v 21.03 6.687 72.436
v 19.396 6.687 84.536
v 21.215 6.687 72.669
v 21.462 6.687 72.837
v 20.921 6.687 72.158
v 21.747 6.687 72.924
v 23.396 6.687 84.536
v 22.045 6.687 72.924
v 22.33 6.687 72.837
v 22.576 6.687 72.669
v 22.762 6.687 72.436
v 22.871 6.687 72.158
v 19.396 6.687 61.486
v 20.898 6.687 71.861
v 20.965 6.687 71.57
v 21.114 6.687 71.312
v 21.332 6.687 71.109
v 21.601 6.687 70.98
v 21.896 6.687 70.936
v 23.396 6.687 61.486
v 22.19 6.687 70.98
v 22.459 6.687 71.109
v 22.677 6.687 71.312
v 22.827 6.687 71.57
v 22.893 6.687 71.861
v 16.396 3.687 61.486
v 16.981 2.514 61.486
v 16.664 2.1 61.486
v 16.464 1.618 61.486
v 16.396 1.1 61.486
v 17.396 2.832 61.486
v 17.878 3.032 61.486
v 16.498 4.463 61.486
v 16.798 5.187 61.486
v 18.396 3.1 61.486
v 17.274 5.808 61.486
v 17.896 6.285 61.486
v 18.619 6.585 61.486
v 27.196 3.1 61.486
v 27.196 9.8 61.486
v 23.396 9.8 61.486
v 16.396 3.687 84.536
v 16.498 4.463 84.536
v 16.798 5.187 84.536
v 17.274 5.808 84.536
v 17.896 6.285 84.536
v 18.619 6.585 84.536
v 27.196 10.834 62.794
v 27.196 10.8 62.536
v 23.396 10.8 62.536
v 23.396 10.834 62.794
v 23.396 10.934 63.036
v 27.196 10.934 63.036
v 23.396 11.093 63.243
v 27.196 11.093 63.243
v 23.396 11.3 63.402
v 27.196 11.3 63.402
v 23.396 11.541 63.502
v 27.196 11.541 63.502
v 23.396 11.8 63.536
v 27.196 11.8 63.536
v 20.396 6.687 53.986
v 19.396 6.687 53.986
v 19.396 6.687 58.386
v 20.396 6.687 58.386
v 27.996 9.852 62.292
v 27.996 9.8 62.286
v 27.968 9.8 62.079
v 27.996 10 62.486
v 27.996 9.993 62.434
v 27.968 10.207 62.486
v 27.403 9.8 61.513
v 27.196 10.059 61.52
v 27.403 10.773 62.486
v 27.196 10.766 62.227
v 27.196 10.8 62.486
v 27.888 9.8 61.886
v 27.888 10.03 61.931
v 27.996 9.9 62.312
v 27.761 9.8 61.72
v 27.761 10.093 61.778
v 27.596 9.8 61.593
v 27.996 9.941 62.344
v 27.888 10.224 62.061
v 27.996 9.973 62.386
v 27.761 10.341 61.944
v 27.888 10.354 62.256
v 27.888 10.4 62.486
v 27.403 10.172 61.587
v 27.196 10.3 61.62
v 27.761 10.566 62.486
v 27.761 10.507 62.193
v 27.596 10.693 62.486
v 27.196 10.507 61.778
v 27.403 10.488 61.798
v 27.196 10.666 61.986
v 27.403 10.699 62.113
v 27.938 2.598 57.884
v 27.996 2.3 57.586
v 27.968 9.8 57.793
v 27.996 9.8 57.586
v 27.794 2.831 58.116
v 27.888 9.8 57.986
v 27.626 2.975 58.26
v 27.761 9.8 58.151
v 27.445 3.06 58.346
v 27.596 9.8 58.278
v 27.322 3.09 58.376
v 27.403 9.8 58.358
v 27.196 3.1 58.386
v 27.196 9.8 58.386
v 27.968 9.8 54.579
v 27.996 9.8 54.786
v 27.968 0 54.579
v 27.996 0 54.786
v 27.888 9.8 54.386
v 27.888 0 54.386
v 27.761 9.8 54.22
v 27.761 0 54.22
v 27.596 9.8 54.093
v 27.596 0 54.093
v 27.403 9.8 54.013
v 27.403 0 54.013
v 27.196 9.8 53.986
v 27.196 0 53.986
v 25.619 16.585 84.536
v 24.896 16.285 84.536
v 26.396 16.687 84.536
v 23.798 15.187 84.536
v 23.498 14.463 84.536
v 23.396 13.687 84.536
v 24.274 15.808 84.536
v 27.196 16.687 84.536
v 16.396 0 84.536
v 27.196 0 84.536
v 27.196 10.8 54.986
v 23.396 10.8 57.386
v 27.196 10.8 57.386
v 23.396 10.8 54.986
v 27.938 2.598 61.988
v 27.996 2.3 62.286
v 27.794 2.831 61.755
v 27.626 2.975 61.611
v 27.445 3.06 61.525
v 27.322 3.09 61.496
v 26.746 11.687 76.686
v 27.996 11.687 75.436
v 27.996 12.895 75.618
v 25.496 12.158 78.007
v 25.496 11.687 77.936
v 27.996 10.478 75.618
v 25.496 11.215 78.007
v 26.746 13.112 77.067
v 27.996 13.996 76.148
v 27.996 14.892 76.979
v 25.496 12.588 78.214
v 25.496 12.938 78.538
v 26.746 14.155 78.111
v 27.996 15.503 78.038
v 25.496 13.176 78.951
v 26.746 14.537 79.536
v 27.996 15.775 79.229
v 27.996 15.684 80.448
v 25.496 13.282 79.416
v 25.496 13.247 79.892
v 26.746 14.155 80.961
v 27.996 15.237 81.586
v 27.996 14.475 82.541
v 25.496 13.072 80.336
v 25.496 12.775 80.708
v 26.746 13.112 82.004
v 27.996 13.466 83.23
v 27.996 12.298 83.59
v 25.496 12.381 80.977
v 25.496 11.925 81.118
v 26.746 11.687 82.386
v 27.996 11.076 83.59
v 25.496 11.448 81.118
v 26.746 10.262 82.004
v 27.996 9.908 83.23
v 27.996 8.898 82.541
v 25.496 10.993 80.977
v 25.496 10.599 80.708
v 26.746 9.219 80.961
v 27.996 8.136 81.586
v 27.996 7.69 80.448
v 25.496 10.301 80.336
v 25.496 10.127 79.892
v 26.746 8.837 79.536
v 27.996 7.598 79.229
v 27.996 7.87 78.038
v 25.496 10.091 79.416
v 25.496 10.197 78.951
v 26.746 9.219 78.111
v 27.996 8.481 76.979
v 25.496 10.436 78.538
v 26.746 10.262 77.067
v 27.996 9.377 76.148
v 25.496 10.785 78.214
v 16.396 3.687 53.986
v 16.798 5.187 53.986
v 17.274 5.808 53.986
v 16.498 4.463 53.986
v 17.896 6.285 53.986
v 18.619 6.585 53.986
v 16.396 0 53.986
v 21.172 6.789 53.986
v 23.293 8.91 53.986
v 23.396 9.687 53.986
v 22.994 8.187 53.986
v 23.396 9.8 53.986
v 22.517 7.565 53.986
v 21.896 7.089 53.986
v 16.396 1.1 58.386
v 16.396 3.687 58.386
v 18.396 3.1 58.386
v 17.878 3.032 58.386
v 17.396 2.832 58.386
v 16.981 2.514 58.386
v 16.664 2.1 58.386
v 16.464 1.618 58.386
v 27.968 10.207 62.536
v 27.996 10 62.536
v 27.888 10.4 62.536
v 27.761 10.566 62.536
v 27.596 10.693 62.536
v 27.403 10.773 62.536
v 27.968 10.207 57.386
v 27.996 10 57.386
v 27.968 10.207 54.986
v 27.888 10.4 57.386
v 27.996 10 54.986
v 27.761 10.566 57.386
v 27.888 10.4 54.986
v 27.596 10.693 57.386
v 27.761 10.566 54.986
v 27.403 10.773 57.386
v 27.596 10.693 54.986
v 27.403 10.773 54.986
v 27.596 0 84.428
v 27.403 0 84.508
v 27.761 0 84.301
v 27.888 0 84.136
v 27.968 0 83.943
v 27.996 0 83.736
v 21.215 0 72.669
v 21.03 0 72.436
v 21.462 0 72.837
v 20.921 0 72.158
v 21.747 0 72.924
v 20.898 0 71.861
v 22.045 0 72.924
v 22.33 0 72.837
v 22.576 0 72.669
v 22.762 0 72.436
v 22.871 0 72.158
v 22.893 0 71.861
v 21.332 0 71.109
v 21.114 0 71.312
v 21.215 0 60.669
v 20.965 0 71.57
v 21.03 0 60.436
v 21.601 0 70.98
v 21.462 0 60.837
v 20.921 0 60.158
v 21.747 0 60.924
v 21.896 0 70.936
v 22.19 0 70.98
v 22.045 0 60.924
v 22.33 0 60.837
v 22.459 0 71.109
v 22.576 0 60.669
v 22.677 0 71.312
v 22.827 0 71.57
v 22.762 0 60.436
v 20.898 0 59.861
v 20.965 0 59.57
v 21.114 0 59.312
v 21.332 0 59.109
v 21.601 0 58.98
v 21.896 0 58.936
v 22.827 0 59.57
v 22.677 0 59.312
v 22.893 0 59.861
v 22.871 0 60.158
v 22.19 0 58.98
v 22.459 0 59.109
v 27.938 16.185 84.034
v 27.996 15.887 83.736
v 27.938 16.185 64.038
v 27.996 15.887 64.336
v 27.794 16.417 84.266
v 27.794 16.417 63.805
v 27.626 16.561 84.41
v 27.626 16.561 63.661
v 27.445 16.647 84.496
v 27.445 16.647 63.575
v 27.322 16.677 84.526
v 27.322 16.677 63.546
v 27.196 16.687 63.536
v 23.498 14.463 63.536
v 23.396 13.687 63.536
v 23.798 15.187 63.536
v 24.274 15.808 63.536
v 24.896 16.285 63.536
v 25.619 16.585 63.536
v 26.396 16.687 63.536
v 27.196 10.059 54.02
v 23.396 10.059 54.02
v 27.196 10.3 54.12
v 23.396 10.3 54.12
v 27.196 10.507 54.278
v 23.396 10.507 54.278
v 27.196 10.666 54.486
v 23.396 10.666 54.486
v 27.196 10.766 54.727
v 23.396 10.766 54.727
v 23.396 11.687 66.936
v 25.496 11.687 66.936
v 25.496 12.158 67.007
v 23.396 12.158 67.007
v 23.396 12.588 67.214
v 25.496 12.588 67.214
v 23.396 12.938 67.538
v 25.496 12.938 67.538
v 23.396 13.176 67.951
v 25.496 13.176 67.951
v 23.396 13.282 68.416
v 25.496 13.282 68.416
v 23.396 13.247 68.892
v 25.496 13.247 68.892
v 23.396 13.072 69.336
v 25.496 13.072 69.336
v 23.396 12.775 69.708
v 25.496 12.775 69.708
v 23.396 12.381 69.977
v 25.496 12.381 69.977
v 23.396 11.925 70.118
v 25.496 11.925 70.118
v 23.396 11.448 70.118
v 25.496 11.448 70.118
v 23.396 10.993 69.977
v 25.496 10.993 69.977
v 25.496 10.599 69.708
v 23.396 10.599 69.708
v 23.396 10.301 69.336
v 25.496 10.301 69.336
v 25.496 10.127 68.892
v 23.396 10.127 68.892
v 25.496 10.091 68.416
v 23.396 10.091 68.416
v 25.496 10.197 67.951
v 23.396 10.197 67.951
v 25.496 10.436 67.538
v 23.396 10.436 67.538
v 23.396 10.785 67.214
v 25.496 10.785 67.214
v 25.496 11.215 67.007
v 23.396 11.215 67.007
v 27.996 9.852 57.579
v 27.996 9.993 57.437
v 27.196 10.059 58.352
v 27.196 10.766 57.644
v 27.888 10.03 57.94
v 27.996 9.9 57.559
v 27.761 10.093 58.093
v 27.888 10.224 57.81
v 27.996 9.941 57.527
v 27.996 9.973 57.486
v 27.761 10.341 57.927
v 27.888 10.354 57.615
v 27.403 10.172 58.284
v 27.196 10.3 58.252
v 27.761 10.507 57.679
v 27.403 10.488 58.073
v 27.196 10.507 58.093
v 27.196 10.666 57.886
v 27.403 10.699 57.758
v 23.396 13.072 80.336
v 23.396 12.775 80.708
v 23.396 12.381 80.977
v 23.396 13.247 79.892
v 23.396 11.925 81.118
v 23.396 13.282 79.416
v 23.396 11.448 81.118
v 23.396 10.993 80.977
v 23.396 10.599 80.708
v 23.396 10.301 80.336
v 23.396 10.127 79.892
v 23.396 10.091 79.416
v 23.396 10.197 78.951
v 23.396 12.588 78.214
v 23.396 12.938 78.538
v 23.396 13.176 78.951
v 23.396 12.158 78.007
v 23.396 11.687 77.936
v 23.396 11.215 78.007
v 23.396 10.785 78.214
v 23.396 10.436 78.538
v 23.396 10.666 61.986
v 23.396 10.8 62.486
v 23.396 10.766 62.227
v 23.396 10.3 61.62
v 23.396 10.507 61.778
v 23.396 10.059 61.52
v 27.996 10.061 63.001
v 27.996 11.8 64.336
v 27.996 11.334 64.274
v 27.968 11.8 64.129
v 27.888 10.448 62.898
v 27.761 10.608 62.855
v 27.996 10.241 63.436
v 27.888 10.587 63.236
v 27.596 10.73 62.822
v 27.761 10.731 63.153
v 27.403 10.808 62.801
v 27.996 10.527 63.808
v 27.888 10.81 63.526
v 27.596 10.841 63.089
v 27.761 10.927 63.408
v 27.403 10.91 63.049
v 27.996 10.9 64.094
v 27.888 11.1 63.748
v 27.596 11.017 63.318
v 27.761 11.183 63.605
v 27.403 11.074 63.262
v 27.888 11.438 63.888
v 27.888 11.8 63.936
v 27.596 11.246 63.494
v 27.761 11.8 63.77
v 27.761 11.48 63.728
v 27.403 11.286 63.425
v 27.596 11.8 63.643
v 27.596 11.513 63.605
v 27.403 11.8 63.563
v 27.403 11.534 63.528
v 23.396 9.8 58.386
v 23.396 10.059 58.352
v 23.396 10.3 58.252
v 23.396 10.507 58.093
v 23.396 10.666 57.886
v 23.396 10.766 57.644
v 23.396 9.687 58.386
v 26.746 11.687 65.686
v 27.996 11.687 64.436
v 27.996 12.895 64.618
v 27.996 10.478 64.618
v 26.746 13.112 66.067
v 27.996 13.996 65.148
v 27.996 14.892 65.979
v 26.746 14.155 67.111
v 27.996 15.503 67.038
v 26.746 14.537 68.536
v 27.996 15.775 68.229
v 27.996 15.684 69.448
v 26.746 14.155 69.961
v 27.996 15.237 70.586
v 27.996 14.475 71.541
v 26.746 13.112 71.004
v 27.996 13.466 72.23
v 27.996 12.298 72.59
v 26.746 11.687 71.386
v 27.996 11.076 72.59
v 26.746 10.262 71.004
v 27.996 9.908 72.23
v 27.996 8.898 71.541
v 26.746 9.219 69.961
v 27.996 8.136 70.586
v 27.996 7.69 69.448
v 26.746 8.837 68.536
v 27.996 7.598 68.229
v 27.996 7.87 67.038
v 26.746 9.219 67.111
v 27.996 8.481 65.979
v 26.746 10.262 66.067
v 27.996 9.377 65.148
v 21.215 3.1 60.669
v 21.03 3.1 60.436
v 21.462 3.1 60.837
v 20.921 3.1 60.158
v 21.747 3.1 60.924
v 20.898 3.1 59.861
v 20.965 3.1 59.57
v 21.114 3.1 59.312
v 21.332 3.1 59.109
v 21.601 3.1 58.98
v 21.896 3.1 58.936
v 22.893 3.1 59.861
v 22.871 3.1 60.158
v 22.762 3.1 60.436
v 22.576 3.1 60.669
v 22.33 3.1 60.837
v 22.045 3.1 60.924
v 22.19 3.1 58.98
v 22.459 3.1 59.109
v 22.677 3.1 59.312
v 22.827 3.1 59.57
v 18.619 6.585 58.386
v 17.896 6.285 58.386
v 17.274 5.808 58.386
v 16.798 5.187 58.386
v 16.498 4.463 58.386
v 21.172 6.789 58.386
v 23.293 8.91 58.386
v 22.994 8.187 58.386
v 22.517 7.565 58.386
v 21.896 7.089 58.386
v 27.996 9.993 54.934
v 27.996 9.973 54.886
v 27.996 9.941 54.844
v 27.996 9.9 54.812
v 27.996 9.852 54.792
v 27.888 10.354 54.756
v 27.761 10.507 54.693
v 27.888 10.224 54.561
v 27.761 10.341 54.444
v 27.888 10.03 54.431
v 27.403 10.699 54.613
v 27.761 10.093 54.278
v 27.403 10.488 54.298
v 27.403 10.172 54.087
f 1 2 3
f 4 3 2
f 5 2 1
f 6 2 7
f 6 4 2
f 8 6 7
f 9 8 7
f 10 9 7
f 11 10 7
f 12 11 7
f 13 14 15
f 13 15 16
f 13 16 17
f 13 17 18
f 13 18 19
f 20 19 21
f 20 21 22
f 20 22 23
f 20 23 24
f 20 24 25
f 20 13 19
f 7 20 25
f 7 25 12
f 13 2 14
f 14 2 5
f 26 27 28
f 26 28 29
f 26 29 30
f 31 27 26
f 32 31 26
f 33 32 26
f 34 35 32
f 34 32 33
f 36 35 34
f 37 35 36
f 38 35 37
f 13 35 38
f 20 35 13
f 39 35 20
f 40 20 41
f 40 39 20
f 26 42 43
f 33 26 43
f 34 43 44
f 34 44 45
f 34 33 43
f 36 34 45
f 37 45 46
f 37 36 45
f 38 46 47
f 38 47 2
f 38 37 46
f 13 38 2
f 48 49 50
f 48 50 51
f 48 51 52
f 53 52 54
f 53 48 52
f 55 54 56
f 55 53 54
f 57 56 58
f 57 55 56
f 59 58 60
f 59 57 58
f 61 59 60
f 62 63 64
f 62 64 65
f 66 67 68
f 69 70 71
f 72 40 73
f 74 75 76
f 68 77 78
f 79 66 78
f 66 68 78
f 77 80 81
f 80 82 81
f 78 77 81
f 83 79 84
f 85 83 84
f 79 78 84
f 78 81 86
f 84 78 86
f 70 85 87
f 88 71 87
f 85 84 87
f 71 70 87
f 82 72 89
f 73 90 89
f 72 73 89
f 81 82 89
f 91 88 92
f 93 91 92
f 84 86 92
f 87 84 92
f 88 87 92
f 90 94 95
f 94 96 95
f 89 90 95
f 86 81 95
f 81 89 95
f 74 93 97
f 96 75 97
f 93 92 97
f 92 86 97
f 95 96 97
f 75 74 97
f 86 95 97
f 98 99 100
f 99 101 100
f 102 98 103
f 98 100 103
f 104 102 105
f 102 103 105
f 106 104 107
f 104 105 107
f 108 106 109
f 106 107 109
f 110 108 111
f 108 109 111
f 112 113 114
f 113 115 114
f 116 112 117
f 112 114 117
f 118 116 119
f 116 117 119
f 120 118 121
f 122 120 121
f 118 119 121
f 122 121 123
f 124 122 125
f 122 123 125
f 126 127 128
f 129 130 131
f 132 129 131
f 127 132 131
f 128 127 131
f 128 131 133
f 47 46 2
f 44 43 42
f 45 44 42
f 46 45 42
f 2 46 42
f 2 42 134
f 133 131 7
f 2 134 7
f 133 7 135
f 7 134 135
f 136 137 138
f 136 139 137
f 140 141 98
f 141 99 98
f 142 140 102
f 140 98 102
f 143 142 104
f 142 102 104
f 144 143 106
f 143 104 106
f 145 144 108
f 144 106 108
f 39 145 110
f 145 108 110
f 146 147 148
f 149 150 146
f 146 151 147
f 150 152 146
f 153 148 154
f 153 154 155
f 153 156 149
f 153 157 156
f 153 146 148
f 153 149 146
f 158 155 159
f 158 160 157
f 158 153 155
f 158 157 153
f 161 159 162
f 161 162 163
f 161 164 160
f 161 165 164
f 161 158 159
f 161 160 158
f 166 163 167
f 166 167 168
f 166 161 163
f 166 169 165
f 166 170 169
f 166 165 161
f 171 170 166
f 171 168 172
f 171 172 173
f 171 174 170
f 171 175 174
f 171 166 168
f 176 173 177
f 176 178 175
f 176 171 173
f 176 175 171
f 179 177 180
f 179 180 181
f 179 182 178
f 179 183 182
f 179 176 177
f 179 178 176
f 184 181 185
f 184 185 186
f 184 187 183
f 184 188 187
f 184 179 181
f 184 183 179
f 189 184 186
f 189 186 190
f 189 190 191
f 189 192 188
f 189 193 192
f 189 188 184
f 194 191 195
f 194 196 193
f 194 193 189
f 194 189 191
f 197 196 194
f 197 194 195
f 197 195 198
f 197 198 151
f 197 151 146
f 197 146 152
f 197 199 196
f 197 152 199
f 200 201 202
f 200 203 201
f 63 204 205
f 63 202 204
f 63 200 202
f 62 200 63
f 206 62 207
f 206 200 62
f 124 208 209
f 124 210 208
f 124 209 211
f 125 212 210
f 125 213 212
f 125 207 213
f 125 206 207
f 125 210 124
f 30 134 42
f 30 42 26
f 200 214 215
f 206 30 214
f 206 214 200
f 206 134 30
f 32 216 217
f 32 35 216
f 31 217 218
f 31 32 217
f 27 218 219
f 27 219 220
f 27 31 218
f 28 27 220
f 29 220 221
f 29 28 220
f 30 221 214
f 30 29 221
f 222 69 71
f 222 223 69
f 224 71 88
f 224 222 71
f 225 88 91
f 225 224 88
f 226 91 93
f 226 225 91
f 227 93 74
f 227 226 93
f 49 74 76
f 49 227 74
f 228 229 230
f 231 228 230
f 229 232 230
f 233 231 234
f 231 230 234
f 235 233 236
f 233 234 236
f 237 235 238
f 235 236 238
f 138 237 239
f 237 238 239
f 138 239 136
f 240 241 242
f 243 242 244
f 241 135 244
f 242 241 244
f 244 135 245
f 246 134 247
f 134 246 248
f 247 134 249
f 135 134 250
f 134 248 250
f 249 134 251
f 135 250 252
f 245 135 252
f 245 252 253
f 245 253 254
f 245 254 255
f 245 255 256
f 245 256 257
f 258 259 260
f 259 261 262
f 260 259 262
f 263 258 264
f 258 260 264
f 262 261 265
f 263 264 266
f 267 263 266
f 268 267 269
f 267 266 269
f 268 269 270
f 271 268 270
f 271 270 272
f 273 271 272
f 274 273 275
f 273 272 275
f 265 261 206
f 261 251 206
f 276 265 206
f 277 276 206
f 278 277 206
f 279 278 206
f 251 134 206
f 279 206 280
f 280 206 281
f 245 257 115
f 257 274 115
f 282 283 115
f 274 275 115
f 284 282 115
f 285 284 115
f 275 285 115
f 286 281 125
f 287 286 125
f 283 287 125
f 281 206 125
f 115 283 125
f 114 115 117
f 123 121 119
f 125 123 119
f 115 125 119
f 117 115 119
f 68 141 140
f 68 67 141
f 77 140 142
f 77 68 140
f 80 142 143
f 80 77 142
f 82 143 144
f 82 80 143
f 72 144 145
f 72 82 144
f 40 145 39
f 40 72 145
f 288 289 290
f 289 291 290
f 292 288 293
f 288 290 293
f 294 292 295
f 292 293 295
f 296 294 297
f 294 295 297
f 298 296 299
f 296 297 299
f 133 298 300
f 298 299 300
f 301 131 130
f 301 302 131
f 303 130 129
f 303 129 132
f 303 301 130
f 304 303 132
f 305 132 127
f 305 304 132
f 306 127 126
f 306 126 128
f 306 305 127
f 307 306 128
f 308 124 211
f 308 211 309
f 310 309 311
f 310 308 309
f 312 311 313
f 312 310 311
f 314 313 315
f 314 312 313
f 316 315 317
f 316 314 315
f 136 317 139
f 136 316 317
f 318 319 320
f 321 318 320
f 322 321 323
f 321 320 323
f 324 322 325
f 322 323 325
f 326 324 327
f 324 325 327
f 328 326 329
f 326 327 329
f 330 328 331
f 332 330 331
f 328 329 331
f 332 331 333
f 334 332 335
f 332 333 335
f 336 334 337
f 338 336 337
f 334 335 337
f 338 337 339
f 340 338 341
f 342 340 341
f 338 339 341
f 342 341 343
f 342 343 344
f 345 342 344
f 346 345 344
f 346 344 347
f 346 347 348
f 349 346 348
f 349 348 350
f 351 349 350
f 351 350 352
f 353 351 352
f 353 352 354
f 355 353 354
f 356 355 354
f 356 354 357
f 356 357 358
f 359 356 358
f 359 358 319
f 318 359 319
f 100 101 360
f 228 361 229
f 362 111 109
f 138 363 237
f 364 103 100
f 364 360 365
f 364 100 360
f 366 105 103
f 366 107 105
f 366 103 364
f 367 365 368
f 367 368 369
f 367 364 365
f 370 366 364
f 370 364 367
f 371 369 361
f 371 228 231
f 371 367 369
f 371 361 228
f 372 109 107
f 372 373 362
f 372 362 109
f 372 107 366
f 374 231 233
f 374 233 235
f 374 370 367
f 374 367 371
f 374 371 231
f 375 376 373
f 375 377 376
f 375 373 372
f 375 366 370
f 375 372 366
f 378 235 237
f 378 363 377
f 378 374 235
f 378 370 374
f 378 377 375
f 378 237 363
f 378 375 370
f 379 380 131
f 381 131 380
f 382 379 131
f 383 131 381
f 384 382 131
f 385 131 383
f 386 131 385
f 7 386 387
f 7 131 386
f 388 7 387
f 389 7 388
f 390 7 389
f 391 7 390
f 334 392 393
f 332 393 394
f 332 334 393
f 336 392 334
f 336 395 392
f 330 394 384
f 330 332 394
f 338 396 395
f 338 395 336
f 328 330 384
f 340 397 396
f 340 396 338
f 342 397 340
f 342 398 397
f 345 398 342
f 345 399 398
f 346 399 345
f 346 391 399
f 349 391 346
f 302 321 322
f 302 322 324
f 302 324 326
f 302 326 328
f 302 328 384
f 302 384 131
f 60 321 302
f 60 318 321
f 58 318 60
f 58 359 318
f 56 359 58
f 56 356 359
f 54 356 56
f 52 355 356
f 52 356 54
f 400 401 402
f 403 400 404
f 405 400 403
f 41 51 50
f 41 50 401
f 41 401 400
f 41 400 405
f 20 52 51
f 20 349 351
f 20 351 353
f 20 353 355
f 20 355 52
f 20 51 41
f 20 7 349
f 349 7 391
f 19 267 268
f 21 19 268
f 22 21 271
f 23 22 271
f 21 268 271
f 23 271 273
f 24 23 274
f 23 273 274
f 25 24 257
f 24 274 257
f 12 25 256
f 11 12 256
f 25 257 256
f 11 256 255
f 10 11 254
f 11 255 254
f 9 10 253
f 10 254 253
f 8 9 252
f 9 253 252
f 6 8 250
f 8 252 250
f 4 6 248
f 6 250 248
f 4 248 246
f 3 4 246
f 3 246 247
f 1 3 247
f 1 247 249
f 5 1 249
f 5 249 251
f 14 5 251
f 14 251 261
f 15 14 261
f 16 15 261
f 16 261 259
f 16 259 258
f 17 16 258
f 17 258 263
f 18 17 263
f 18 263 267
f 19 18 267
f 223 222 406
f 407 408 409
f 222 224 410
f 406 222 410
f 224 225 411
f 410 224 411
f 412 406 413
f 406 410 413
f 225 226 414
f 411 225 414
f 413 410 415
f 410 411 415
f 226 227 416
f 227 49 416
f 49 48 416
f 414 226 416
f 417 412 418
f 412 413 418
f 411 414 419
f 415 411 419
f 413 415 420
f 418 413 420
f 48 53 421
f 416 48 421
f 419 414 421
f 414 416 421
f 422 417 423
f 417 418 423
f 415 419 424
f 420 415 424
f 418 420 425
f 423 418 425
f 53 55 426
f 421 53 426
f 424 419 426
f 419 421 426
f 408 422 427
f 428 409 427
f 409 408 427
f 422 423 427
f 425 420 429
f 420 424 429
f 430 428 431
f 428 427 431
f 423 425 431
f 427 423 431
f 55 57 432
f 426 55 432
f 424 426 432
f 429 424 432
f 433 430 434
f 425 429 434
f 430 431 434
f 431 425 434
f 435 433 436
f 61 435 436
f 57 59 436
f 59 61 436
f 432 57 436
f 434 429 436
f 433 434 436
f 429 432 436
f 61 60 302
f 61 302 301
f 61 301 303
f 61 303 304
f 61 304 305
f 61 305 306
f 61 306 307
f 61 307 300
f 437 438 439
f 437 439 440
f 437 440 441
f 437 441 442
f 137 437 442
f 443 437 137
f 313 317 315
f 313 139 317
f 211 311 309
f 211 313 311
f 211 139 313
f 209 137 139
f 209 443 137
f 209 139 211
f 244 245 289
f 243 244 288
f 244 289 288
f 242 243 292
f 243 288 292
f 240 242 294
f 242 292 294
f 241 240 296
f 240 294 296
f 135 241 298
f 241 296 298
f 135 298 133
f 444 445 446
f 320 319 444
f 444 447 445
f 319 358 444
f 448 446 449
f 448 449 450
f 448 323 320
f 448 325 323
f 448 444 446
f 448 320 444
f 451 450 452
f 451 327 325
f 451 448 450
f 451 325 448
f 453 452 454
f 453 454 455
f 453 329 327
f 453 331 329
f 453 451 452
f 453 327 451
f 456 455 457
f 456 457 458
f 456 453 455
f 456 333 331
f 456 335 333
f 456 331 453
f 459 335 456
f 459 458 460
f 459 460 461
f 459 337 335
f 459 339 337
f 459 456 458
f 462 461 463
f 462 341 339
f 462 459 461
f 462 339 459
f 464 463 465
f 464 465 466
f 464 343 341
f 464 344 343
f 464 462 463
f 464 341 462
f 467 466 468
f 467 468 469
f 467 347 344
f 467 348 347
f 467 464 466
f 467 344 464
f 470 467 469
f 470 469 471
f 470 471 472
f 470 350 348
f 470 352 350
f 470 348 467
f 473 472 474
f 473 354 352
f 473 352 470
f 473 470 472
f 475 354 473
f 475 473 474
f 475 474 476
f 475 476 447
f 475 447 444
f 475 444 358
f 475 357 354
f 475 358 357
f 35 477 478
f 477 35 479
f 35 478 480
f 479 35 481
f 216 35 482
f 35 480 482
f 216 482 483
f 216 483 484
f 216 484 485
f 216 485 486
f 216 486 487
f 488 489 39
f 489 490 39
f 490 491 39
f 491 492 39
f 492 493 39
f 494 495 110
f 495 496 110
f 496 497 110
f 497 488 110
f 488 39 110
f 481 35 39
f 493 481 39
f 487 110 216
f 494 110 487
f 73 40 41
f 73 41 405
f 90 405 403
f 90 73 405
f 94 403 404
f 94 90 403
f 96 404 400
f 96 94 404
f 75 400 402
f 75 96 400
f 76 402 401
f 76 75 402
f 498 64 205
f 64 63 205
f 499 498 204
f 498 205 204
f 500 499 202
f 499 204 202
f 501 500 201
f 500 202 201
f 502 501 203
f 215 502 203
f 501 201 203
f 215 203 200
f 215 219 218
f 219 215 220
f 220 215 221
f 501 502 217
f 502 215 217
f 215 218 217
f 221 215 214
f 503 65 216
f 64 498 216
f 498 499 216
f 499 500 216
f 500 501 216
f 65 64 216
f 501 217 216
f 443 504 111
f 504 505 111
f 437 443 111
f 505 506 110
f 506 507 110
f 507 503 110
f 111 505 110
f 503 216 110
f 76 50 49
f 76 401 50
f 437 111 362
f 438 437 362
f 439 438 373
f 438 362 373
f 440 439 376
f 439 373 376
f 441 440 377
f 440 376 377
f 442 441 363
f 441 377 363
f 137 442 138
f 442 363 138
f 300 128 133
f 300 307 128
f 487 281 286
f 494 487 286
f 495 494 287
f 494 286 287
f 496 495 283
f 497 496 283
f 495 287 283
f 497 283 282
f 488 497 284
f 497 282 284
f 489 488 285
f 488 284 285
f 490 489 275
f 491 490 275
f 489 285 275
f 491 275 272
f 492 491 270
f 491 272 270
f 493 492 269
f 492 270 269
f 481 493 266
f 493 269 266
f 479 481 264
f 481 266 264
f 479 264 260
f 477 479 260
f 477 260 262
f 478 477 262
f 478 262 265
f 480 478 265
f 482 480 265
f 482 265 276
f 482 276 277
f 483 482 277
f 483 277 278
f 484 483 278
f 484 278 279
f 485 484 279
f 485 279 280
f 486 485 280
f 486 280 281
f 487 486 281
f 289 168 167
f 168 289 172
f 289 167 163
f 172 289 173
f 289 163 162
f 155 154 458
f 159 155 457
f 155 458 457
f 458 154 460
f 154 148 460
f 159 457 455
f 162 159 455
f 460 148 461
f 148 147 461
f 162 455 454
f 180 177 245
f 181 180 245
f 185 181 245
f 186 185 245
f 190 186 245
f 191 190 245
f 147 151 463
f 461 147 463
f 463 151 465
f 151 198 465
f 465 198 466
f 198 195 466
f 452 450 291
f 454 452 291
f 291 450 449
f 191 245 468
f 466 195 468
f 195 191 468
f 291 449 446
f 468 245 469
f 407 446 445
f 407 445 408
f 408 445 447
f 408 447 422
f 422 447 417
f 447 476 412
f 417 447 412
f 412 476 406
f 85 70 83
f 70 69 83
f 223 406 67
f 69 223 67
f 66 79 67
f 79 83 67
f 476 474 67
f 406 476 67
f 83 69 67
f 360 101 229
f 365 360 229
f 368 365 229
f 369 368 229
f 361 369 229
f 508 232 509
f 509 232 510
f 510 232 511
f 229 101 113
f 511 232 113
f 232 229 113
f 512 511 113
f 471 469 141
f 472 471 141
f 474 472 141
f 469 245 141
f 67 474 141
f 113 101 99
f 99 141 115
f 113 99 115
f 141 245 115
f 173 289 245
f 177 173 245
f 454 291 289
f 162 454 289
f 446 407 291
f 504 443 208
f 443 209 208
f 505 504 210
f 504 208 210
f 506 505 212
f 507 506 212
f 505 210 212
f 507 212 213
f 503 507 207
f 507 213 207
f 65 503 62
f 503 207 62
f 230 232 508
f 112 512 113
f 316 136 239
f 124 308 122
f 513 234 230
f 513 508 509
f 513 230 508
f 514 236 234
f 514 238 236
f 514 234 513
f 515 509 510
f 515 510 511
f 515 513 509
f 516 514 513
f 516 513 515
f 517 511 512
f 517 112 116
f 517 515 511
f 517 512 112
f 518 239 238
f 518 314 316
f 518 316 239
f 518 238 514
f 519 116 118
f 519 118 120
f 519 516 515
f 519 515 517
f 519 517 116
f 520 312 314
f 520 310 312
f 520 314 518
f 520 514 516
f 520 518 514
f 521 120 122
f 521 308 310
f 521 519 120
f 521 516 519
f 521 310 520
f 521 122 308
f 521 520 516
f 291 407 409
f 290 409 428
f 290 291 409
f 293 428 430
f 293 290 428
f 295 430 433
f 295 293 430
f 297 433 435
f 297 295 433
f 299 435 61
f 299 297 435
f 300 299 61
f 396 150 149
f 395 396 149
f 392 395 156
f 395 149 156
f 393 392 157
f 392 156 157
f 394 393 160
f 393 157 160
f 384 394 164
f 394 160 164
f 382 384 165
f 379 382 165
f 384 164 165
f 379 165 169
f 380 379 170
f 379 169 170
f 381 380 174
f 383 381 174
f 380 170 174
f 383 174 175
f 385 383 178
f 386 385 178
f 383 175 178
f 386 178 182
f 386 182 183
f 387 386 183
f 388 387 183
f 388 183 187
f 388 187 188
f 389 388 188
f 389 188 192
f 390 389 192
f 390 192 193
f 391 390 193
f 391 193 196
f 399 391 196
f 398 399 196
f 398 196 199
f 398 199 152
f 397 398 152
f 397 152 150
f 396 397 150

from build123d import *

# Parameters (mm, degrees)
BOSS_EXTRUDE1_DEPTH      = 6.686777
BOSS_EXTRUDE1_DEPTH_BACK = 0.0001
SKETCH1_W                = 11.6
SKETCH1_H                = 30.55
SKETCH2_W                = 4.6
SKETCH2_H                = 21
BOSS_EXTRUDE3_DEPTH      = 10
FILLET1_R                = 3
SKETCH3_W                = 4.6
SKETCH3_H                = 4.4
SKETCH3_H_2              = 2.05
BOSS_EXTRUDE4_DEPTH      = 4.113123252
SKETCH4_W                = 3.1
SKETCH4_H                = 3.586876748
CUT_EXTRUDE1_DEPTH       = 87.944077783
SKETCH5_R                = 1.6
CUT_EXTRUDE2_DEPTH       = 87.944077783
SKETCH6_R                = 1
CUT_EXTRUDE3_DEPTH       = 91.600623245
FILLET2_R                = 1
FILLET3_R                = 3
FILLET4_R                = 2
CHAMFER1_SIZE            = 2.5
FILLET5_R                = 0.8


with BuildPart() as part:
    # Sketch1 → Boss-Extrude1 (new, two sides: drawn at the far end of the back side and taken through both)
    with BuildSketch(Plane(origin=(0, 0, 0), x_dir=(1, 0, 0), z_dir=(0, 1, 0)).offset(-BOSS_EXTRUDE1_DEPTH_BACK)):
        with Locations((22.195659191, -69.260579157)):
            Rectangle(SKETCH1_W, SKETCH1_H)
    extrude(amount=BOSS_EXTRUDE1_DEPTH + BOSS_EXTRUDE1_DEPTH_BACK)

    # Sketch2 → Boss-Extrude3 (add)
    with BuildSketch(Plane(origin=(0, 6.686776748, 0), x_dir=(1, 0, 0), z_dir=(0, 1, 0))):
        with Locations((25.695659191, -74.035579157)):
            Rectangle(SKETCH2_W, SKETCH2_H)
    extrude(amount=BOSS_EXTRUDE3_DEPTH)

    # Fillet1
    fillet1_edges = [part.edges().sort_by_distance(p)[0] for p in [
        (23.395659191, 16.686776748, 74.035579157),
    ]]
    fillet(fillet1_edges, radius=FILLET1_R)

    # Sketch3 → Boss-Extrude4 (add)
    with BuildSketch(Plane(origin=(0, 6.686776748, 0), x_dir=(1, 0, 0), z_dir=(0, 1, 0))):
        with Locations((25.695659191, -56.185579157)):
            Rectangle(SKETCH3_W, SKETCH3_H)
        with Locations((25.695659191, -62.510579157)):
            Rectangle(SKETCH3_W, SKETCH3_H_2)
    extrude(amount=BOSS_EXTRUDE4_DEPTH)

    # Sketch4 → Cut-Extrude1 (cut, through all)
    with BuildSketch(Plane(origin=(27.995659191, 0, 0), x_dir=(0, 0, -1), z_dir=(1, 0, 0))):
        with Locations((-59.935579157, 4.893338374)):
            Rectangle(SKETCH4_W, SKETCH4_H)
    extrude(amount=-CUT_EXTRUDE1_DEPTH, mode=Mode.SUBTRACT)

    # Sketch5 → Cut-Extrude2 (cut, through all)
    with BuildSketch(Plane(origin=(27.995659191, 0, 0), x_dir=(0, 0, -1), z_dir=(1, 0, 0))):
        with Locations((-68.535579157, 11.686776748)):
            Circle(SKETCH5_R)
        with Locations((-79.535579157, 11.686776748)):
            Circle(SKETCH5_R)
    extrude(amount=-CUT_EXTRUDE2_DEPTH, mode=Mode.SUBTRACT)

    # Sketch6 → Cut-Extrude3 (cut, through all)
    with BuildSketch(Plane.XZ.offset(0.0001)):
        with Locations(Location((21.895659191, 59.935579157, 0), (0, 0, 270))):
            Circle(SKETCH6_R)
        with Locations(Location((21.895659191, 71.935579157, 0), (0, 0, 270))):
            Circle(SKETCH6_R)
    extrude(amount=-CUT_EXTRUDE3_DEPTH, mode=Mode.SUBTRACT)

    # Fillet2
    fillet2_edges = [part.edges().sort_by_distance(p)[0] for p in [
        (25.695659191, 10.7999, 58.385579157),
        (25.695659191, 10.7999, 53.985579157),
        (25.695659191, 10.7999, 61.485579157),
        (25.695659191, 10.7999, 63.535579157),
    ]]
    fillet(fillet2_edges, radius=FILLET2_R)

    # Fillet3
    fillet3_edges = [part.edges().sort_by_distance(p)[0] for p in [
        (16.395659191, 6.686777, 73.010579157),
        (16.395659191, 6.686777, 56.185579157),
        (23.395659191, 6.686776748, 56.185579157),
    ]]
    fillet(fillet3_edges, radius=FILLET3_R)

    # Fillet4
    fillet4_edges = [part.edges().sort_by_distance(p)[0] for p in [
        (16.395659191, 3.0999, 59.935579157),
    ]]
    fillet(fillet4_edges, radius=FILLET4_R)

    # Chamfer1
    chamfer1_edges = [part.edges().sort_by_distance(p)[0] for p in [
        (27.995659191, 11.686776748, 70.135579157),
        (27.995659191, 11.686776748, 81.135579157),
    ]]
    chamfer(chamfer1_edges, length=CHAMFER1_SIZE)

    # Fillet5
    fillet5_edges = [part.edges().sort_by_distance(p)[0] for p in [
        (27.995659191, 10.7999, 56.185579157),
        (27.995659191, 6.4499, 58.385579157),
        (27.995659191, 6.4499, 61.485579157),
        (27.995659191, 10.7999, 62.510579157),
        (27.995659191, 10.507006781, 58.092685938),
        (27.995659191, 10.507006781, 61.778472375),
        (27.995659191, 10.507006781, 54.278472375),
        (27.995659191, 11.092793218, 63.242685938),
        (27.995659191, 14.243338374, 63.535579157),
        (27.995659191, 16.686776748, 74.035579157),
        (27.995659191, 8.343338374, 84.535579157),
        (27.995659191, 4.8999, 53.985579157),
        (27.995659191, 3.0999, 59.935579157),
    ]]
    fillet(fillet5_edges, radius=FILLET5_R)


solid = part.part
